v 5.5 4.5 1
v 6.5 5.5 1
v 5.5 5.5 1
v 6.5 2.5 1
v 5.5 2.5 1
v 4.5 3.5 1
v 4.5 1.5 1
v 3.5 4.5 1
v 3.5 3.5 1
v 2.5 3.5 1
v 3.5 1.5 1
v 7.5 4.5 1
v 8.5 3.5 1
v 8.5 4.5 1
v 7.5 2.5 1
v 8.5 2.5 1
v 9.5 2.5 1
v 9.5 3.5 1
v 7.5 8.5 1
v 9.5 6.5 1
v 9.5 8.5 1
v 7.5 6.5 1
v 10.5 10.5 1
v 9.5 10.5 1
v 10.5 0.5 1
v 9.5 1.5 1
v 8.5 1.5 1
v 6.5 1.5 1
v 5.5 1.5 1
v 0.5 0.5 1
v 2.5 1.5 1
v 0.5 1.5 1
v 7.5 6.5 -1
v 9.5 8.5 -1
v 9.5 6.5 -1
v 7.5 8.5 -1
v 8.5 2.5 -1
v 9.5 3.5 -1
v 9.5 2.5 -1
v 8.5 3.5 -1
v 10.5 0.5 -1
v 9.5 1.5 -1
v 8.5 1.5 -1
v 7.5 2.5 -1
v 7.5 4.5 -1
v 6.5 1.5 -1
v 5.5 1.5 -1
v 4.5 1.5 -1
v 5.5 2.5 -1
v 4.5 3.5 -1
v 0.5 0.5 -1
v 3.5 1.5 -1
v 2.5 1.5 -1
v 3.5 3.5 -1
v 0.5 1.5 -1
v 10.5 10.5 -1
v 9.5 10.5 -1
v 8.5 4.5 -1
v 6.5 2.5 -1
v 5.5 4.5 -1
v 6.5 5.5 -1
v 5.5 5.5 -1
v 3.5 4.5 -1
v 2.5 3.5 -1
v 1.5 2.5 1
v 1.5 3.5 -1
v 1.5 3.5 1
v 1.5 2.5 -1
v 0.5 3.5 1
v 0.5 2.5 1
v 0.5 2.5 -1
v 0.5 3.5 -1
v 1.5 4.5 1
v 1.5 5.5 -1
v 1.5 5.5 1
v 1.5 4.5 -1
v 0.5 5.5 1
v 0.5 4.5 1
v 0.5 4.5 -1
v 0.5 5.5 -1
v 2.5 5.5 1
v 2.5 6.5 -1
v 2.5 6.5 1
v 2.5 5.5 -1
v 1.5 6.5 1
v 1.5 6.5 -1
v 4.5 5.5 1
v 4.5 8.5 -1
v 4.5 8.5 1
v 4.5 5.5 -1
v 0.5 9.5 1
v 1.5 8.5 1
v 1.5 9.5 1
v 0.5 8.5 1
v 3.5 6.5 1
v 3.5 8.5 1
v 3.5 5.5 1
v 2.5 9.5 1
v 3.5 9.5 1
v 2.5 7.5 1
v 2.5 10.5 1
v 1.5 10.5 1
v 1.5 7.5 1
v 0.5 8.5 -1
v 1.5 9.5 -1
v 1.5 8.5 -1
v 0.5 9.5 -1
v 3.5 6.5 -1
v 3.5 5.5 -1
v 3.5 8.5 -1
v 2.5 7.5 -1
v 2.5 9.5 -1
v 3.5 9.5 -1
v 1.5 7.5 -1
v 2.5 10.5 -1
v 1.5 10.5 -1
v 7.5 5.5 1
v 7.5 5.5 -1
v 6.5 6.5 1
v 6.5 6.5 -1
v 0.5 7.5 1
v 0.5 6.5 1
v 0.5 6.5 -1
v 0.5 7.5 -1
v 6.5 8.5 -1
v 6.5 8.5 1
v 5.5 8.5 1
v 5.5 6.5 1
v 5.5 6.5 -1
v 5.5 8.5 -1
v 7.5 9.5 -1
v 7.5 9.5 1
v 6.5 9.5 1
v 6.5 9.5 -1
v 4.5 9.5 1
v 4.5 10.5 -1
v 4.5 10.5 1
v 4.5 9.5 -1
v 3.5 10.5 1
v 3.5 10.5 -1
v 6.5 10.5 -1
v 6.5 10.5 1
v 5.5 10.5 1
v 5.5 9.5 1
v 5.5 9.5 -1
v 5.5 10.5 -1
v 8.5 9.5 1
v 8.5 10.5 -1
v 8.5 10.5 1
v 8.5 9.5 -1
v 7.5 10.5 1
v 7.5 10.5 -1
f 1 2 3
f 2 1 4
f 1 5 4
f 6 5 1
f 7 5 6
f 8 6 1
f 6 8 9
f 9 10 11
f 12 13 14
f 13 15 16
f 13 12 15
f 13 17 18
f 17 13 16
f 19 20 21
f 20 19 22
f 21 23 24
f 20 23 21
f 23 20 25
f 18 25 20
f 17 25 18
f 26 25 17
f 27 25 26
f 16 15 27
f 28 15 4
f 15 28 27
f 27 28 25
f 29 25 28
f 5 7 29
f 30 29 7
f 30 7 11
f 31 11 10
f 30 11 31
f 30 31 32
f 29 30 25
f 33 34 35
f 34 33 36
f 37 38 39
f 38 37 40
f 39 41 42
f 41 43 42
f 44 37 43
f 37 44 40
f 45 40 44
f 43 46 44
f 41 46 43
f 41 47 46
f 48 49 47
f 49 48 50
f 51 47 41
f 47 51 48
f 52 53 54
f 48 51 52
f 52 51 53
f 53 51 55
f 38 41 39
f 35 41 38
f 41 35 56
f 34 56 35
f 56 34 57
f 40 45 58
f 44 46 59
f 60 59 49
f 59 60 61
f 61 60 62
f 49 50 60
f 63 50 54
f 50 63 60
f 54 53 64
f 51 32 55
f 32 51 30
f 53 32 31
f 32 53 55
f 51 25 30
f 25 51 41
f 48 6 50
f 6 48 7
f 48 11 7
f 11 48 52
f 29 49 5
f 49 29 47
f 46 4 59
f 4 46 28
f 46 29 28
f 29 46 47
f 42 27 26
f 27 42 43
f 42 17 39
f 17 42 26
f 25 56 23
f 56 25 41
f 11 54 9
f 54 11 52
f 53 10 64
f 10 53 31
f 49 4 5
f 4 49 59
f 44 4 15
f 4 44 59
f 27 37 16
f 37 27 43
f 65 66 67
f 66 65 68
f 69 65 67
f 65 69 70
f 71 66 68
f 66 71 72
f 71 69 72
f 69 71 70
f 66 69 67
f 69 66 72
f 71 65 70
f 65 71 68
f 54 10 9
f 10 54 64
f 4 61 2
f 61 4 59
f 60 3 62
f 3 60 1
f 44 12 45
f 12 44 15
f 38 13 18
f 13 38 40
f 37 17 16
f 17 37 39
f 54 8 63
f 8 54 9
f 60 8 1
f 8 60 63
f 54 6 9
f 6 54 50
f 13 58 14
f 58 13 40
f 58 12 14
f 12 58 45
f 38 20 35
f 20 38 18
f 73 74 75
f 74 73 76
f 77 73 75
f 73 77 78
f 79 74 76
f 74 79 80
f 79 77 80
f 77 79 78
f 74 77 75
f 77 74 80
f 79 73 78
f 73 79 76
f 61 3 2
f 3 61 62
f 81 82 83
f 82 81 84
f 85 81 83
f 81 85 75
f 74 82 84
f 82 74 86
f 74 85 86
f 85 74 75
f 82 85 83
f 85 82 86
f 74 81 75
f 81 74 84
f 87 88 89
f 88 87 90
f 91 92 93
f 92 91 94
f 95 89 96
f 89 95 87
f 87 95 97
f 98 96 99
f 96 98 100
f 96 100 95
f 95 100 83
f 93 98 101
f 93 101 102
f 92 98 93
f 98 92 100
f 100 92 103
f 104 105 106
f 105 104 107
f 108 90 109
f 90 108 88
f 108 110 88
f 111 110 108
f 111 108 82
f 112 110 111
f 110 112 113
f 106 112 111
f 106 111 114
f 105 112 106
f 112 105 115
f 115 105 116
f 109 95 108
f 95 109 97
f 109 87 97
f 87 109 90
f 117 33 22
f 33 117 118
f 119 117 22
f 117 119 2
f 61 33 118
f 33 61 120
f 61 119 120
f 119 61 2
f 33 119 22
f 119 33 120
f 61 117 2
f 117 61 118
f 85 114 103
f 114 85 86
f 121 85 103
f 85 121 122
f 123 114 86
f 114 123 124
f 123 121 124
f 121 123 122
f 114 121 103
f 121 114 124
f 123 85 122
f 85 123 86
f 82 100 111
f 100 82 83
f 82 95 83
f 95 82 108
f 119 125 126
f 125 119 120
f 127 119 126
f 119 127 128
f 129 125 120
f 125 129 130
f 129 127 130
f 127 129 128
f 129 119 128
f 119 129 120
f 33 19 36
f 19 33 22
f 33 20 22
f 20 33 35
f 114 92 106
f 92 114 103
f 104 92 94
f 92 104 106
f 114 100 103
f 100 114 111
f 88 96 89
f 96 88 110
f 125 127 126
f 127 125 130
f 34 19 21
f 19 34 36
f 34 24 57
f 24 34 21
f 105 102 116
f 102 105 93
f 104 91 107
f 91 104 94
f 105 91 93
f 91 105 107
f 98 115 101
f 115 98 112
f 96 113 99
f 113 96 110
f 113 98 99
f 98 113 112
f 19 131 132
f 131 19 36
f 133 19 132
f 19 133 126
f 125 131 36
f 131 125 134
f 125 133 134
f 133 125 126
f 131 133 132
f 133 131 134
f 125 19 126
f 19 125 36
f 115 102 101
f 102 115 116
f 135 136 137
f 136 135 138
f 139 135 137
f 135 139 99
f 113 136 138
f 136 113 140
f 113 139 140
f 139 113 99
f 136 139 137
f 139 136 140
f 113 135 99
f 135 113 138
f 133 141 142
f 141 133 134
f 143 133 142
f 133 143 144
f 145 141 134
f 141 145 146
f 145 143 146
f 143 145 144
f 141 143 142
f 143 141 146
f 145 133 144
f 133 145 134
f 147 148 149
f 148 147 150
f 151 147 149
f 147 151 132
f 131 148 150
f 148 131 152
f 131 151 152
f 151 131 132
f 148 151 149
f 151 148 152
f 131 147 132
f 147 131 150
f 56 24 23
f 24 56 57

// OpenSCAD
rotate([0,0,0])translate([0,0,0,]){
translate([1,1,0])  cube(size = [1,1,2], center=true);
translate([2,1,0])  cube(size = [1,1,2], center=true);
translate([3,1,0])  cube(size = [1,1,2], center=true);
translate([4,1,0])  cube(size = [1,1,2], center=true);
translate([5,1,0])  cube(size = [1,1,2], center=true);
translate([6,1,0])  cube(size = [1,1,2], center=true);
translate([7,1,0])  cube(size = [1,1,2], center=true);
translate([8,1,0])  cube(size = [1,1,2], center=true);
translate([9,1,0])  cube(size = [1,1,2], center=true);
translate([10,1,0])  cube(size = [1,1,2], center=true);
translate([10,1,0])  cube(size = [1,1,2], center=true);
translate([10,1,0])  cube(size = [1,1,2], center=true);
translate([3,2,0])  cube(size = [1,1,2], center=true);
translate([3,2,0])  cube(size = [1,1,2], center=true);
translate([5,2,0])  cube(size = [1,1,2], center=true);
translate([5,2,0])  cube(size = [1,1,2], center=true);
translate([7,2,0])  cube(size = [1,1,2], center=true);
translate([8,2,0])  cube(size = [1,1,2], center=true);
translate([8,2,0])  cube(size = [1,1,2], center=true);
translate([10,2,0])  cube(size = [1,1,2], center=true);
translate([1,3,0])  cube(size = [1,1,2], center=true);
translate([1,3,0])  cube(size = [1,1,2], center=true);
translate([3,3,0])  cube(size = [1,1,2], center=true);
translate([3,3,0])  cube(size = [1,1,2], center=true);
translate([5,3,0])  cube(size = [1,1,2], center=true);
translate([6,3,0])  cube(size = [1,1,2], center=true);
translate([6,3,0])  cube(size = [1,1,2], center=true);
translate([8,3,0])  cube(size = [1,1,2], center=true);
translate([9,3,0])  cube(size = [1,1,2], center=true);
translate([10,3,0])  cube(size = [1,1,2], center=true);
translate([10,3,0])  cube(size = [1,1,2], center=true);
translate([10,3,0])  cube(size = [1,1,2], center=true);
translate([10,3,0])  cube(size = [1,1,2], center=true);
translate([4,4,0])  cube(size = [1,1,2], center=true);
translate([5,4,0])  cube(size = [1,1,2], center=true);
translate([6,4,0])  cube(size = [1,1,2], center=true);
translate([6,4,0])  cube(size = [1,1,2], center=true);
translate([8,4,0])  cube(size = [1,1,2], center=true);
translate([8,4,0])  cube(size = [1,1,2], center=true);
translate([10,4,0])  cube(size = [1,1,2], center=true);
translate([1,5,0])  cube(size = [1,1,2], center=true);
translate([1,5,0])  cube(size = [1,1,2], center=true);
translate([1,5,0])  cube(size = [1,1,2], center=true);
translate([1,5,0])  cube(size = [1,1,2], center=true);
translate([1,5,0])  cube(size = [1,1,2], center=true);
translate([6,5,0])  cube(size = [1,1,2], center=true);
translate([6,5,0])  cube(size = [1,1,2], center=true);
translate([6,5,0])  cube(size = [1,1,2], center=true);
translate([6,5,0])  cube(size = [1,1,2], center=true);
translate([10,5,0])  cube(size = [1,1,2], center=true);
translate([10,5,0])  cube(size = [1,1,2], center=true);
translate([2,6,0])  cube(size = [1,1,2], center=true);
translate([2,6,0])  cube(size = [1,1,2], center=true);
translate([4,6,0])  cube(size = [1,1,2], center=true);
translate([4,6,0])  cube(size = [1,1,2], center=true);
translate([4,6,0])  cube(size = [1,1,2], center=true);
translate([7,6,0])  cube(size = [1,1,2], center=true);
translate([7,6,0])  cube(size = [1,1,2], center=true);
translate([7,6,0])  cube(size = [1,1,2], center=true);
translate([10,6,0])  cube(size = [1,1,2], center=true);
translate([1,7,0])  cube(size = [1,1,2], center=true);
translate([1,7,0])  cube(size = [1,1,2], center=true);
translate([3,7,0])  cube(size = [1,1,2], center=true);
translate([4,7,0])  cube(size = [1,1,2], center=true);
translate([4,7,0])  cube(size = [1,1,2], center=true);
translate([6,7,0])  cube(size = [1,1,2], center=true);
translate([6,7,0])  cube(size = [1,1,2], center=true);
translate([8,7,0])  cube(size = [1,1,2], center=true);
translate([9,7,0])  cube(size = [1,1,2], center=true);
translate([10,7,0])  cube(size = [1,1,2], center=true);
translate([10,7,0])  cube(size = [1,1,2], center=true);
translate([2,8,0])  cube(size = [1,1,2], center=true);
translate([3,8,0])  cube(size = [1,1,2], center=true);
translate([4,8,0])  cube(size = [1,1,2], center=true);
translate([4,8,0])  cube(size = [1,1,2], center=true);
translate([6,8,0])  cube(size = [1,1,2], center=true);
translate([6,8,0])  cube(size = [1,1,2], center=true);
translate([8,8,0])  cube(size = [1,1,2], center=true);
translate([9,8,0])  cube(size = [1,1,2], center=true);
translate([10,8,0])  cube(size = [1,1,2], center=true);
translate([1,9,0])  cube(size = [1,1,2], center=true);
translate([2,9,0])  cube(size = [1,1,2], center=true);
translate([3,9,0])  cube(size = [1,1,2], center=true);
translate([3,9,0])  cube(size = [1,1,2], center=true);
translate([3,9,0])  cube(size = [1,1,2], center=true);
translate([3,9,0])  cube(size = [1,1,2], center=true);
translate([7,9,0])  cube(size = [1,1,2], center=true);
translate([7,9,0])  cube(size = [1,1,2], center=true);
translate([7,9,0])  cube(size = [1,1,2], center=true);
translate([10,9,0])  cube(size = [1,1,2], center=true);
translate([10,9,0])  cube(size = [1,1,2], center=true);
translate([2,10,0])  cube(size = [1,1,2], center=true);
translate([2,10,0])  cube(size = [1,1,2], center=true);
translate([4,10,0])  cube(size = [1,1,2], center=true);
translate([4,10,0])  cube(size = [1,1,2], center=true);
translate([6,10,0])  cube(size = [1,1,2], center=true);
translate([6,10,0])  cube(size = [1,1,2], center=true);
translate([8,10,0])  cube(size = [1,1,2], center=true);
translate([8,10,0])  cube(size = [1,1,2], center=true);
translate([10,10,0])  cube(size = [1,1,2], center=true);
}
